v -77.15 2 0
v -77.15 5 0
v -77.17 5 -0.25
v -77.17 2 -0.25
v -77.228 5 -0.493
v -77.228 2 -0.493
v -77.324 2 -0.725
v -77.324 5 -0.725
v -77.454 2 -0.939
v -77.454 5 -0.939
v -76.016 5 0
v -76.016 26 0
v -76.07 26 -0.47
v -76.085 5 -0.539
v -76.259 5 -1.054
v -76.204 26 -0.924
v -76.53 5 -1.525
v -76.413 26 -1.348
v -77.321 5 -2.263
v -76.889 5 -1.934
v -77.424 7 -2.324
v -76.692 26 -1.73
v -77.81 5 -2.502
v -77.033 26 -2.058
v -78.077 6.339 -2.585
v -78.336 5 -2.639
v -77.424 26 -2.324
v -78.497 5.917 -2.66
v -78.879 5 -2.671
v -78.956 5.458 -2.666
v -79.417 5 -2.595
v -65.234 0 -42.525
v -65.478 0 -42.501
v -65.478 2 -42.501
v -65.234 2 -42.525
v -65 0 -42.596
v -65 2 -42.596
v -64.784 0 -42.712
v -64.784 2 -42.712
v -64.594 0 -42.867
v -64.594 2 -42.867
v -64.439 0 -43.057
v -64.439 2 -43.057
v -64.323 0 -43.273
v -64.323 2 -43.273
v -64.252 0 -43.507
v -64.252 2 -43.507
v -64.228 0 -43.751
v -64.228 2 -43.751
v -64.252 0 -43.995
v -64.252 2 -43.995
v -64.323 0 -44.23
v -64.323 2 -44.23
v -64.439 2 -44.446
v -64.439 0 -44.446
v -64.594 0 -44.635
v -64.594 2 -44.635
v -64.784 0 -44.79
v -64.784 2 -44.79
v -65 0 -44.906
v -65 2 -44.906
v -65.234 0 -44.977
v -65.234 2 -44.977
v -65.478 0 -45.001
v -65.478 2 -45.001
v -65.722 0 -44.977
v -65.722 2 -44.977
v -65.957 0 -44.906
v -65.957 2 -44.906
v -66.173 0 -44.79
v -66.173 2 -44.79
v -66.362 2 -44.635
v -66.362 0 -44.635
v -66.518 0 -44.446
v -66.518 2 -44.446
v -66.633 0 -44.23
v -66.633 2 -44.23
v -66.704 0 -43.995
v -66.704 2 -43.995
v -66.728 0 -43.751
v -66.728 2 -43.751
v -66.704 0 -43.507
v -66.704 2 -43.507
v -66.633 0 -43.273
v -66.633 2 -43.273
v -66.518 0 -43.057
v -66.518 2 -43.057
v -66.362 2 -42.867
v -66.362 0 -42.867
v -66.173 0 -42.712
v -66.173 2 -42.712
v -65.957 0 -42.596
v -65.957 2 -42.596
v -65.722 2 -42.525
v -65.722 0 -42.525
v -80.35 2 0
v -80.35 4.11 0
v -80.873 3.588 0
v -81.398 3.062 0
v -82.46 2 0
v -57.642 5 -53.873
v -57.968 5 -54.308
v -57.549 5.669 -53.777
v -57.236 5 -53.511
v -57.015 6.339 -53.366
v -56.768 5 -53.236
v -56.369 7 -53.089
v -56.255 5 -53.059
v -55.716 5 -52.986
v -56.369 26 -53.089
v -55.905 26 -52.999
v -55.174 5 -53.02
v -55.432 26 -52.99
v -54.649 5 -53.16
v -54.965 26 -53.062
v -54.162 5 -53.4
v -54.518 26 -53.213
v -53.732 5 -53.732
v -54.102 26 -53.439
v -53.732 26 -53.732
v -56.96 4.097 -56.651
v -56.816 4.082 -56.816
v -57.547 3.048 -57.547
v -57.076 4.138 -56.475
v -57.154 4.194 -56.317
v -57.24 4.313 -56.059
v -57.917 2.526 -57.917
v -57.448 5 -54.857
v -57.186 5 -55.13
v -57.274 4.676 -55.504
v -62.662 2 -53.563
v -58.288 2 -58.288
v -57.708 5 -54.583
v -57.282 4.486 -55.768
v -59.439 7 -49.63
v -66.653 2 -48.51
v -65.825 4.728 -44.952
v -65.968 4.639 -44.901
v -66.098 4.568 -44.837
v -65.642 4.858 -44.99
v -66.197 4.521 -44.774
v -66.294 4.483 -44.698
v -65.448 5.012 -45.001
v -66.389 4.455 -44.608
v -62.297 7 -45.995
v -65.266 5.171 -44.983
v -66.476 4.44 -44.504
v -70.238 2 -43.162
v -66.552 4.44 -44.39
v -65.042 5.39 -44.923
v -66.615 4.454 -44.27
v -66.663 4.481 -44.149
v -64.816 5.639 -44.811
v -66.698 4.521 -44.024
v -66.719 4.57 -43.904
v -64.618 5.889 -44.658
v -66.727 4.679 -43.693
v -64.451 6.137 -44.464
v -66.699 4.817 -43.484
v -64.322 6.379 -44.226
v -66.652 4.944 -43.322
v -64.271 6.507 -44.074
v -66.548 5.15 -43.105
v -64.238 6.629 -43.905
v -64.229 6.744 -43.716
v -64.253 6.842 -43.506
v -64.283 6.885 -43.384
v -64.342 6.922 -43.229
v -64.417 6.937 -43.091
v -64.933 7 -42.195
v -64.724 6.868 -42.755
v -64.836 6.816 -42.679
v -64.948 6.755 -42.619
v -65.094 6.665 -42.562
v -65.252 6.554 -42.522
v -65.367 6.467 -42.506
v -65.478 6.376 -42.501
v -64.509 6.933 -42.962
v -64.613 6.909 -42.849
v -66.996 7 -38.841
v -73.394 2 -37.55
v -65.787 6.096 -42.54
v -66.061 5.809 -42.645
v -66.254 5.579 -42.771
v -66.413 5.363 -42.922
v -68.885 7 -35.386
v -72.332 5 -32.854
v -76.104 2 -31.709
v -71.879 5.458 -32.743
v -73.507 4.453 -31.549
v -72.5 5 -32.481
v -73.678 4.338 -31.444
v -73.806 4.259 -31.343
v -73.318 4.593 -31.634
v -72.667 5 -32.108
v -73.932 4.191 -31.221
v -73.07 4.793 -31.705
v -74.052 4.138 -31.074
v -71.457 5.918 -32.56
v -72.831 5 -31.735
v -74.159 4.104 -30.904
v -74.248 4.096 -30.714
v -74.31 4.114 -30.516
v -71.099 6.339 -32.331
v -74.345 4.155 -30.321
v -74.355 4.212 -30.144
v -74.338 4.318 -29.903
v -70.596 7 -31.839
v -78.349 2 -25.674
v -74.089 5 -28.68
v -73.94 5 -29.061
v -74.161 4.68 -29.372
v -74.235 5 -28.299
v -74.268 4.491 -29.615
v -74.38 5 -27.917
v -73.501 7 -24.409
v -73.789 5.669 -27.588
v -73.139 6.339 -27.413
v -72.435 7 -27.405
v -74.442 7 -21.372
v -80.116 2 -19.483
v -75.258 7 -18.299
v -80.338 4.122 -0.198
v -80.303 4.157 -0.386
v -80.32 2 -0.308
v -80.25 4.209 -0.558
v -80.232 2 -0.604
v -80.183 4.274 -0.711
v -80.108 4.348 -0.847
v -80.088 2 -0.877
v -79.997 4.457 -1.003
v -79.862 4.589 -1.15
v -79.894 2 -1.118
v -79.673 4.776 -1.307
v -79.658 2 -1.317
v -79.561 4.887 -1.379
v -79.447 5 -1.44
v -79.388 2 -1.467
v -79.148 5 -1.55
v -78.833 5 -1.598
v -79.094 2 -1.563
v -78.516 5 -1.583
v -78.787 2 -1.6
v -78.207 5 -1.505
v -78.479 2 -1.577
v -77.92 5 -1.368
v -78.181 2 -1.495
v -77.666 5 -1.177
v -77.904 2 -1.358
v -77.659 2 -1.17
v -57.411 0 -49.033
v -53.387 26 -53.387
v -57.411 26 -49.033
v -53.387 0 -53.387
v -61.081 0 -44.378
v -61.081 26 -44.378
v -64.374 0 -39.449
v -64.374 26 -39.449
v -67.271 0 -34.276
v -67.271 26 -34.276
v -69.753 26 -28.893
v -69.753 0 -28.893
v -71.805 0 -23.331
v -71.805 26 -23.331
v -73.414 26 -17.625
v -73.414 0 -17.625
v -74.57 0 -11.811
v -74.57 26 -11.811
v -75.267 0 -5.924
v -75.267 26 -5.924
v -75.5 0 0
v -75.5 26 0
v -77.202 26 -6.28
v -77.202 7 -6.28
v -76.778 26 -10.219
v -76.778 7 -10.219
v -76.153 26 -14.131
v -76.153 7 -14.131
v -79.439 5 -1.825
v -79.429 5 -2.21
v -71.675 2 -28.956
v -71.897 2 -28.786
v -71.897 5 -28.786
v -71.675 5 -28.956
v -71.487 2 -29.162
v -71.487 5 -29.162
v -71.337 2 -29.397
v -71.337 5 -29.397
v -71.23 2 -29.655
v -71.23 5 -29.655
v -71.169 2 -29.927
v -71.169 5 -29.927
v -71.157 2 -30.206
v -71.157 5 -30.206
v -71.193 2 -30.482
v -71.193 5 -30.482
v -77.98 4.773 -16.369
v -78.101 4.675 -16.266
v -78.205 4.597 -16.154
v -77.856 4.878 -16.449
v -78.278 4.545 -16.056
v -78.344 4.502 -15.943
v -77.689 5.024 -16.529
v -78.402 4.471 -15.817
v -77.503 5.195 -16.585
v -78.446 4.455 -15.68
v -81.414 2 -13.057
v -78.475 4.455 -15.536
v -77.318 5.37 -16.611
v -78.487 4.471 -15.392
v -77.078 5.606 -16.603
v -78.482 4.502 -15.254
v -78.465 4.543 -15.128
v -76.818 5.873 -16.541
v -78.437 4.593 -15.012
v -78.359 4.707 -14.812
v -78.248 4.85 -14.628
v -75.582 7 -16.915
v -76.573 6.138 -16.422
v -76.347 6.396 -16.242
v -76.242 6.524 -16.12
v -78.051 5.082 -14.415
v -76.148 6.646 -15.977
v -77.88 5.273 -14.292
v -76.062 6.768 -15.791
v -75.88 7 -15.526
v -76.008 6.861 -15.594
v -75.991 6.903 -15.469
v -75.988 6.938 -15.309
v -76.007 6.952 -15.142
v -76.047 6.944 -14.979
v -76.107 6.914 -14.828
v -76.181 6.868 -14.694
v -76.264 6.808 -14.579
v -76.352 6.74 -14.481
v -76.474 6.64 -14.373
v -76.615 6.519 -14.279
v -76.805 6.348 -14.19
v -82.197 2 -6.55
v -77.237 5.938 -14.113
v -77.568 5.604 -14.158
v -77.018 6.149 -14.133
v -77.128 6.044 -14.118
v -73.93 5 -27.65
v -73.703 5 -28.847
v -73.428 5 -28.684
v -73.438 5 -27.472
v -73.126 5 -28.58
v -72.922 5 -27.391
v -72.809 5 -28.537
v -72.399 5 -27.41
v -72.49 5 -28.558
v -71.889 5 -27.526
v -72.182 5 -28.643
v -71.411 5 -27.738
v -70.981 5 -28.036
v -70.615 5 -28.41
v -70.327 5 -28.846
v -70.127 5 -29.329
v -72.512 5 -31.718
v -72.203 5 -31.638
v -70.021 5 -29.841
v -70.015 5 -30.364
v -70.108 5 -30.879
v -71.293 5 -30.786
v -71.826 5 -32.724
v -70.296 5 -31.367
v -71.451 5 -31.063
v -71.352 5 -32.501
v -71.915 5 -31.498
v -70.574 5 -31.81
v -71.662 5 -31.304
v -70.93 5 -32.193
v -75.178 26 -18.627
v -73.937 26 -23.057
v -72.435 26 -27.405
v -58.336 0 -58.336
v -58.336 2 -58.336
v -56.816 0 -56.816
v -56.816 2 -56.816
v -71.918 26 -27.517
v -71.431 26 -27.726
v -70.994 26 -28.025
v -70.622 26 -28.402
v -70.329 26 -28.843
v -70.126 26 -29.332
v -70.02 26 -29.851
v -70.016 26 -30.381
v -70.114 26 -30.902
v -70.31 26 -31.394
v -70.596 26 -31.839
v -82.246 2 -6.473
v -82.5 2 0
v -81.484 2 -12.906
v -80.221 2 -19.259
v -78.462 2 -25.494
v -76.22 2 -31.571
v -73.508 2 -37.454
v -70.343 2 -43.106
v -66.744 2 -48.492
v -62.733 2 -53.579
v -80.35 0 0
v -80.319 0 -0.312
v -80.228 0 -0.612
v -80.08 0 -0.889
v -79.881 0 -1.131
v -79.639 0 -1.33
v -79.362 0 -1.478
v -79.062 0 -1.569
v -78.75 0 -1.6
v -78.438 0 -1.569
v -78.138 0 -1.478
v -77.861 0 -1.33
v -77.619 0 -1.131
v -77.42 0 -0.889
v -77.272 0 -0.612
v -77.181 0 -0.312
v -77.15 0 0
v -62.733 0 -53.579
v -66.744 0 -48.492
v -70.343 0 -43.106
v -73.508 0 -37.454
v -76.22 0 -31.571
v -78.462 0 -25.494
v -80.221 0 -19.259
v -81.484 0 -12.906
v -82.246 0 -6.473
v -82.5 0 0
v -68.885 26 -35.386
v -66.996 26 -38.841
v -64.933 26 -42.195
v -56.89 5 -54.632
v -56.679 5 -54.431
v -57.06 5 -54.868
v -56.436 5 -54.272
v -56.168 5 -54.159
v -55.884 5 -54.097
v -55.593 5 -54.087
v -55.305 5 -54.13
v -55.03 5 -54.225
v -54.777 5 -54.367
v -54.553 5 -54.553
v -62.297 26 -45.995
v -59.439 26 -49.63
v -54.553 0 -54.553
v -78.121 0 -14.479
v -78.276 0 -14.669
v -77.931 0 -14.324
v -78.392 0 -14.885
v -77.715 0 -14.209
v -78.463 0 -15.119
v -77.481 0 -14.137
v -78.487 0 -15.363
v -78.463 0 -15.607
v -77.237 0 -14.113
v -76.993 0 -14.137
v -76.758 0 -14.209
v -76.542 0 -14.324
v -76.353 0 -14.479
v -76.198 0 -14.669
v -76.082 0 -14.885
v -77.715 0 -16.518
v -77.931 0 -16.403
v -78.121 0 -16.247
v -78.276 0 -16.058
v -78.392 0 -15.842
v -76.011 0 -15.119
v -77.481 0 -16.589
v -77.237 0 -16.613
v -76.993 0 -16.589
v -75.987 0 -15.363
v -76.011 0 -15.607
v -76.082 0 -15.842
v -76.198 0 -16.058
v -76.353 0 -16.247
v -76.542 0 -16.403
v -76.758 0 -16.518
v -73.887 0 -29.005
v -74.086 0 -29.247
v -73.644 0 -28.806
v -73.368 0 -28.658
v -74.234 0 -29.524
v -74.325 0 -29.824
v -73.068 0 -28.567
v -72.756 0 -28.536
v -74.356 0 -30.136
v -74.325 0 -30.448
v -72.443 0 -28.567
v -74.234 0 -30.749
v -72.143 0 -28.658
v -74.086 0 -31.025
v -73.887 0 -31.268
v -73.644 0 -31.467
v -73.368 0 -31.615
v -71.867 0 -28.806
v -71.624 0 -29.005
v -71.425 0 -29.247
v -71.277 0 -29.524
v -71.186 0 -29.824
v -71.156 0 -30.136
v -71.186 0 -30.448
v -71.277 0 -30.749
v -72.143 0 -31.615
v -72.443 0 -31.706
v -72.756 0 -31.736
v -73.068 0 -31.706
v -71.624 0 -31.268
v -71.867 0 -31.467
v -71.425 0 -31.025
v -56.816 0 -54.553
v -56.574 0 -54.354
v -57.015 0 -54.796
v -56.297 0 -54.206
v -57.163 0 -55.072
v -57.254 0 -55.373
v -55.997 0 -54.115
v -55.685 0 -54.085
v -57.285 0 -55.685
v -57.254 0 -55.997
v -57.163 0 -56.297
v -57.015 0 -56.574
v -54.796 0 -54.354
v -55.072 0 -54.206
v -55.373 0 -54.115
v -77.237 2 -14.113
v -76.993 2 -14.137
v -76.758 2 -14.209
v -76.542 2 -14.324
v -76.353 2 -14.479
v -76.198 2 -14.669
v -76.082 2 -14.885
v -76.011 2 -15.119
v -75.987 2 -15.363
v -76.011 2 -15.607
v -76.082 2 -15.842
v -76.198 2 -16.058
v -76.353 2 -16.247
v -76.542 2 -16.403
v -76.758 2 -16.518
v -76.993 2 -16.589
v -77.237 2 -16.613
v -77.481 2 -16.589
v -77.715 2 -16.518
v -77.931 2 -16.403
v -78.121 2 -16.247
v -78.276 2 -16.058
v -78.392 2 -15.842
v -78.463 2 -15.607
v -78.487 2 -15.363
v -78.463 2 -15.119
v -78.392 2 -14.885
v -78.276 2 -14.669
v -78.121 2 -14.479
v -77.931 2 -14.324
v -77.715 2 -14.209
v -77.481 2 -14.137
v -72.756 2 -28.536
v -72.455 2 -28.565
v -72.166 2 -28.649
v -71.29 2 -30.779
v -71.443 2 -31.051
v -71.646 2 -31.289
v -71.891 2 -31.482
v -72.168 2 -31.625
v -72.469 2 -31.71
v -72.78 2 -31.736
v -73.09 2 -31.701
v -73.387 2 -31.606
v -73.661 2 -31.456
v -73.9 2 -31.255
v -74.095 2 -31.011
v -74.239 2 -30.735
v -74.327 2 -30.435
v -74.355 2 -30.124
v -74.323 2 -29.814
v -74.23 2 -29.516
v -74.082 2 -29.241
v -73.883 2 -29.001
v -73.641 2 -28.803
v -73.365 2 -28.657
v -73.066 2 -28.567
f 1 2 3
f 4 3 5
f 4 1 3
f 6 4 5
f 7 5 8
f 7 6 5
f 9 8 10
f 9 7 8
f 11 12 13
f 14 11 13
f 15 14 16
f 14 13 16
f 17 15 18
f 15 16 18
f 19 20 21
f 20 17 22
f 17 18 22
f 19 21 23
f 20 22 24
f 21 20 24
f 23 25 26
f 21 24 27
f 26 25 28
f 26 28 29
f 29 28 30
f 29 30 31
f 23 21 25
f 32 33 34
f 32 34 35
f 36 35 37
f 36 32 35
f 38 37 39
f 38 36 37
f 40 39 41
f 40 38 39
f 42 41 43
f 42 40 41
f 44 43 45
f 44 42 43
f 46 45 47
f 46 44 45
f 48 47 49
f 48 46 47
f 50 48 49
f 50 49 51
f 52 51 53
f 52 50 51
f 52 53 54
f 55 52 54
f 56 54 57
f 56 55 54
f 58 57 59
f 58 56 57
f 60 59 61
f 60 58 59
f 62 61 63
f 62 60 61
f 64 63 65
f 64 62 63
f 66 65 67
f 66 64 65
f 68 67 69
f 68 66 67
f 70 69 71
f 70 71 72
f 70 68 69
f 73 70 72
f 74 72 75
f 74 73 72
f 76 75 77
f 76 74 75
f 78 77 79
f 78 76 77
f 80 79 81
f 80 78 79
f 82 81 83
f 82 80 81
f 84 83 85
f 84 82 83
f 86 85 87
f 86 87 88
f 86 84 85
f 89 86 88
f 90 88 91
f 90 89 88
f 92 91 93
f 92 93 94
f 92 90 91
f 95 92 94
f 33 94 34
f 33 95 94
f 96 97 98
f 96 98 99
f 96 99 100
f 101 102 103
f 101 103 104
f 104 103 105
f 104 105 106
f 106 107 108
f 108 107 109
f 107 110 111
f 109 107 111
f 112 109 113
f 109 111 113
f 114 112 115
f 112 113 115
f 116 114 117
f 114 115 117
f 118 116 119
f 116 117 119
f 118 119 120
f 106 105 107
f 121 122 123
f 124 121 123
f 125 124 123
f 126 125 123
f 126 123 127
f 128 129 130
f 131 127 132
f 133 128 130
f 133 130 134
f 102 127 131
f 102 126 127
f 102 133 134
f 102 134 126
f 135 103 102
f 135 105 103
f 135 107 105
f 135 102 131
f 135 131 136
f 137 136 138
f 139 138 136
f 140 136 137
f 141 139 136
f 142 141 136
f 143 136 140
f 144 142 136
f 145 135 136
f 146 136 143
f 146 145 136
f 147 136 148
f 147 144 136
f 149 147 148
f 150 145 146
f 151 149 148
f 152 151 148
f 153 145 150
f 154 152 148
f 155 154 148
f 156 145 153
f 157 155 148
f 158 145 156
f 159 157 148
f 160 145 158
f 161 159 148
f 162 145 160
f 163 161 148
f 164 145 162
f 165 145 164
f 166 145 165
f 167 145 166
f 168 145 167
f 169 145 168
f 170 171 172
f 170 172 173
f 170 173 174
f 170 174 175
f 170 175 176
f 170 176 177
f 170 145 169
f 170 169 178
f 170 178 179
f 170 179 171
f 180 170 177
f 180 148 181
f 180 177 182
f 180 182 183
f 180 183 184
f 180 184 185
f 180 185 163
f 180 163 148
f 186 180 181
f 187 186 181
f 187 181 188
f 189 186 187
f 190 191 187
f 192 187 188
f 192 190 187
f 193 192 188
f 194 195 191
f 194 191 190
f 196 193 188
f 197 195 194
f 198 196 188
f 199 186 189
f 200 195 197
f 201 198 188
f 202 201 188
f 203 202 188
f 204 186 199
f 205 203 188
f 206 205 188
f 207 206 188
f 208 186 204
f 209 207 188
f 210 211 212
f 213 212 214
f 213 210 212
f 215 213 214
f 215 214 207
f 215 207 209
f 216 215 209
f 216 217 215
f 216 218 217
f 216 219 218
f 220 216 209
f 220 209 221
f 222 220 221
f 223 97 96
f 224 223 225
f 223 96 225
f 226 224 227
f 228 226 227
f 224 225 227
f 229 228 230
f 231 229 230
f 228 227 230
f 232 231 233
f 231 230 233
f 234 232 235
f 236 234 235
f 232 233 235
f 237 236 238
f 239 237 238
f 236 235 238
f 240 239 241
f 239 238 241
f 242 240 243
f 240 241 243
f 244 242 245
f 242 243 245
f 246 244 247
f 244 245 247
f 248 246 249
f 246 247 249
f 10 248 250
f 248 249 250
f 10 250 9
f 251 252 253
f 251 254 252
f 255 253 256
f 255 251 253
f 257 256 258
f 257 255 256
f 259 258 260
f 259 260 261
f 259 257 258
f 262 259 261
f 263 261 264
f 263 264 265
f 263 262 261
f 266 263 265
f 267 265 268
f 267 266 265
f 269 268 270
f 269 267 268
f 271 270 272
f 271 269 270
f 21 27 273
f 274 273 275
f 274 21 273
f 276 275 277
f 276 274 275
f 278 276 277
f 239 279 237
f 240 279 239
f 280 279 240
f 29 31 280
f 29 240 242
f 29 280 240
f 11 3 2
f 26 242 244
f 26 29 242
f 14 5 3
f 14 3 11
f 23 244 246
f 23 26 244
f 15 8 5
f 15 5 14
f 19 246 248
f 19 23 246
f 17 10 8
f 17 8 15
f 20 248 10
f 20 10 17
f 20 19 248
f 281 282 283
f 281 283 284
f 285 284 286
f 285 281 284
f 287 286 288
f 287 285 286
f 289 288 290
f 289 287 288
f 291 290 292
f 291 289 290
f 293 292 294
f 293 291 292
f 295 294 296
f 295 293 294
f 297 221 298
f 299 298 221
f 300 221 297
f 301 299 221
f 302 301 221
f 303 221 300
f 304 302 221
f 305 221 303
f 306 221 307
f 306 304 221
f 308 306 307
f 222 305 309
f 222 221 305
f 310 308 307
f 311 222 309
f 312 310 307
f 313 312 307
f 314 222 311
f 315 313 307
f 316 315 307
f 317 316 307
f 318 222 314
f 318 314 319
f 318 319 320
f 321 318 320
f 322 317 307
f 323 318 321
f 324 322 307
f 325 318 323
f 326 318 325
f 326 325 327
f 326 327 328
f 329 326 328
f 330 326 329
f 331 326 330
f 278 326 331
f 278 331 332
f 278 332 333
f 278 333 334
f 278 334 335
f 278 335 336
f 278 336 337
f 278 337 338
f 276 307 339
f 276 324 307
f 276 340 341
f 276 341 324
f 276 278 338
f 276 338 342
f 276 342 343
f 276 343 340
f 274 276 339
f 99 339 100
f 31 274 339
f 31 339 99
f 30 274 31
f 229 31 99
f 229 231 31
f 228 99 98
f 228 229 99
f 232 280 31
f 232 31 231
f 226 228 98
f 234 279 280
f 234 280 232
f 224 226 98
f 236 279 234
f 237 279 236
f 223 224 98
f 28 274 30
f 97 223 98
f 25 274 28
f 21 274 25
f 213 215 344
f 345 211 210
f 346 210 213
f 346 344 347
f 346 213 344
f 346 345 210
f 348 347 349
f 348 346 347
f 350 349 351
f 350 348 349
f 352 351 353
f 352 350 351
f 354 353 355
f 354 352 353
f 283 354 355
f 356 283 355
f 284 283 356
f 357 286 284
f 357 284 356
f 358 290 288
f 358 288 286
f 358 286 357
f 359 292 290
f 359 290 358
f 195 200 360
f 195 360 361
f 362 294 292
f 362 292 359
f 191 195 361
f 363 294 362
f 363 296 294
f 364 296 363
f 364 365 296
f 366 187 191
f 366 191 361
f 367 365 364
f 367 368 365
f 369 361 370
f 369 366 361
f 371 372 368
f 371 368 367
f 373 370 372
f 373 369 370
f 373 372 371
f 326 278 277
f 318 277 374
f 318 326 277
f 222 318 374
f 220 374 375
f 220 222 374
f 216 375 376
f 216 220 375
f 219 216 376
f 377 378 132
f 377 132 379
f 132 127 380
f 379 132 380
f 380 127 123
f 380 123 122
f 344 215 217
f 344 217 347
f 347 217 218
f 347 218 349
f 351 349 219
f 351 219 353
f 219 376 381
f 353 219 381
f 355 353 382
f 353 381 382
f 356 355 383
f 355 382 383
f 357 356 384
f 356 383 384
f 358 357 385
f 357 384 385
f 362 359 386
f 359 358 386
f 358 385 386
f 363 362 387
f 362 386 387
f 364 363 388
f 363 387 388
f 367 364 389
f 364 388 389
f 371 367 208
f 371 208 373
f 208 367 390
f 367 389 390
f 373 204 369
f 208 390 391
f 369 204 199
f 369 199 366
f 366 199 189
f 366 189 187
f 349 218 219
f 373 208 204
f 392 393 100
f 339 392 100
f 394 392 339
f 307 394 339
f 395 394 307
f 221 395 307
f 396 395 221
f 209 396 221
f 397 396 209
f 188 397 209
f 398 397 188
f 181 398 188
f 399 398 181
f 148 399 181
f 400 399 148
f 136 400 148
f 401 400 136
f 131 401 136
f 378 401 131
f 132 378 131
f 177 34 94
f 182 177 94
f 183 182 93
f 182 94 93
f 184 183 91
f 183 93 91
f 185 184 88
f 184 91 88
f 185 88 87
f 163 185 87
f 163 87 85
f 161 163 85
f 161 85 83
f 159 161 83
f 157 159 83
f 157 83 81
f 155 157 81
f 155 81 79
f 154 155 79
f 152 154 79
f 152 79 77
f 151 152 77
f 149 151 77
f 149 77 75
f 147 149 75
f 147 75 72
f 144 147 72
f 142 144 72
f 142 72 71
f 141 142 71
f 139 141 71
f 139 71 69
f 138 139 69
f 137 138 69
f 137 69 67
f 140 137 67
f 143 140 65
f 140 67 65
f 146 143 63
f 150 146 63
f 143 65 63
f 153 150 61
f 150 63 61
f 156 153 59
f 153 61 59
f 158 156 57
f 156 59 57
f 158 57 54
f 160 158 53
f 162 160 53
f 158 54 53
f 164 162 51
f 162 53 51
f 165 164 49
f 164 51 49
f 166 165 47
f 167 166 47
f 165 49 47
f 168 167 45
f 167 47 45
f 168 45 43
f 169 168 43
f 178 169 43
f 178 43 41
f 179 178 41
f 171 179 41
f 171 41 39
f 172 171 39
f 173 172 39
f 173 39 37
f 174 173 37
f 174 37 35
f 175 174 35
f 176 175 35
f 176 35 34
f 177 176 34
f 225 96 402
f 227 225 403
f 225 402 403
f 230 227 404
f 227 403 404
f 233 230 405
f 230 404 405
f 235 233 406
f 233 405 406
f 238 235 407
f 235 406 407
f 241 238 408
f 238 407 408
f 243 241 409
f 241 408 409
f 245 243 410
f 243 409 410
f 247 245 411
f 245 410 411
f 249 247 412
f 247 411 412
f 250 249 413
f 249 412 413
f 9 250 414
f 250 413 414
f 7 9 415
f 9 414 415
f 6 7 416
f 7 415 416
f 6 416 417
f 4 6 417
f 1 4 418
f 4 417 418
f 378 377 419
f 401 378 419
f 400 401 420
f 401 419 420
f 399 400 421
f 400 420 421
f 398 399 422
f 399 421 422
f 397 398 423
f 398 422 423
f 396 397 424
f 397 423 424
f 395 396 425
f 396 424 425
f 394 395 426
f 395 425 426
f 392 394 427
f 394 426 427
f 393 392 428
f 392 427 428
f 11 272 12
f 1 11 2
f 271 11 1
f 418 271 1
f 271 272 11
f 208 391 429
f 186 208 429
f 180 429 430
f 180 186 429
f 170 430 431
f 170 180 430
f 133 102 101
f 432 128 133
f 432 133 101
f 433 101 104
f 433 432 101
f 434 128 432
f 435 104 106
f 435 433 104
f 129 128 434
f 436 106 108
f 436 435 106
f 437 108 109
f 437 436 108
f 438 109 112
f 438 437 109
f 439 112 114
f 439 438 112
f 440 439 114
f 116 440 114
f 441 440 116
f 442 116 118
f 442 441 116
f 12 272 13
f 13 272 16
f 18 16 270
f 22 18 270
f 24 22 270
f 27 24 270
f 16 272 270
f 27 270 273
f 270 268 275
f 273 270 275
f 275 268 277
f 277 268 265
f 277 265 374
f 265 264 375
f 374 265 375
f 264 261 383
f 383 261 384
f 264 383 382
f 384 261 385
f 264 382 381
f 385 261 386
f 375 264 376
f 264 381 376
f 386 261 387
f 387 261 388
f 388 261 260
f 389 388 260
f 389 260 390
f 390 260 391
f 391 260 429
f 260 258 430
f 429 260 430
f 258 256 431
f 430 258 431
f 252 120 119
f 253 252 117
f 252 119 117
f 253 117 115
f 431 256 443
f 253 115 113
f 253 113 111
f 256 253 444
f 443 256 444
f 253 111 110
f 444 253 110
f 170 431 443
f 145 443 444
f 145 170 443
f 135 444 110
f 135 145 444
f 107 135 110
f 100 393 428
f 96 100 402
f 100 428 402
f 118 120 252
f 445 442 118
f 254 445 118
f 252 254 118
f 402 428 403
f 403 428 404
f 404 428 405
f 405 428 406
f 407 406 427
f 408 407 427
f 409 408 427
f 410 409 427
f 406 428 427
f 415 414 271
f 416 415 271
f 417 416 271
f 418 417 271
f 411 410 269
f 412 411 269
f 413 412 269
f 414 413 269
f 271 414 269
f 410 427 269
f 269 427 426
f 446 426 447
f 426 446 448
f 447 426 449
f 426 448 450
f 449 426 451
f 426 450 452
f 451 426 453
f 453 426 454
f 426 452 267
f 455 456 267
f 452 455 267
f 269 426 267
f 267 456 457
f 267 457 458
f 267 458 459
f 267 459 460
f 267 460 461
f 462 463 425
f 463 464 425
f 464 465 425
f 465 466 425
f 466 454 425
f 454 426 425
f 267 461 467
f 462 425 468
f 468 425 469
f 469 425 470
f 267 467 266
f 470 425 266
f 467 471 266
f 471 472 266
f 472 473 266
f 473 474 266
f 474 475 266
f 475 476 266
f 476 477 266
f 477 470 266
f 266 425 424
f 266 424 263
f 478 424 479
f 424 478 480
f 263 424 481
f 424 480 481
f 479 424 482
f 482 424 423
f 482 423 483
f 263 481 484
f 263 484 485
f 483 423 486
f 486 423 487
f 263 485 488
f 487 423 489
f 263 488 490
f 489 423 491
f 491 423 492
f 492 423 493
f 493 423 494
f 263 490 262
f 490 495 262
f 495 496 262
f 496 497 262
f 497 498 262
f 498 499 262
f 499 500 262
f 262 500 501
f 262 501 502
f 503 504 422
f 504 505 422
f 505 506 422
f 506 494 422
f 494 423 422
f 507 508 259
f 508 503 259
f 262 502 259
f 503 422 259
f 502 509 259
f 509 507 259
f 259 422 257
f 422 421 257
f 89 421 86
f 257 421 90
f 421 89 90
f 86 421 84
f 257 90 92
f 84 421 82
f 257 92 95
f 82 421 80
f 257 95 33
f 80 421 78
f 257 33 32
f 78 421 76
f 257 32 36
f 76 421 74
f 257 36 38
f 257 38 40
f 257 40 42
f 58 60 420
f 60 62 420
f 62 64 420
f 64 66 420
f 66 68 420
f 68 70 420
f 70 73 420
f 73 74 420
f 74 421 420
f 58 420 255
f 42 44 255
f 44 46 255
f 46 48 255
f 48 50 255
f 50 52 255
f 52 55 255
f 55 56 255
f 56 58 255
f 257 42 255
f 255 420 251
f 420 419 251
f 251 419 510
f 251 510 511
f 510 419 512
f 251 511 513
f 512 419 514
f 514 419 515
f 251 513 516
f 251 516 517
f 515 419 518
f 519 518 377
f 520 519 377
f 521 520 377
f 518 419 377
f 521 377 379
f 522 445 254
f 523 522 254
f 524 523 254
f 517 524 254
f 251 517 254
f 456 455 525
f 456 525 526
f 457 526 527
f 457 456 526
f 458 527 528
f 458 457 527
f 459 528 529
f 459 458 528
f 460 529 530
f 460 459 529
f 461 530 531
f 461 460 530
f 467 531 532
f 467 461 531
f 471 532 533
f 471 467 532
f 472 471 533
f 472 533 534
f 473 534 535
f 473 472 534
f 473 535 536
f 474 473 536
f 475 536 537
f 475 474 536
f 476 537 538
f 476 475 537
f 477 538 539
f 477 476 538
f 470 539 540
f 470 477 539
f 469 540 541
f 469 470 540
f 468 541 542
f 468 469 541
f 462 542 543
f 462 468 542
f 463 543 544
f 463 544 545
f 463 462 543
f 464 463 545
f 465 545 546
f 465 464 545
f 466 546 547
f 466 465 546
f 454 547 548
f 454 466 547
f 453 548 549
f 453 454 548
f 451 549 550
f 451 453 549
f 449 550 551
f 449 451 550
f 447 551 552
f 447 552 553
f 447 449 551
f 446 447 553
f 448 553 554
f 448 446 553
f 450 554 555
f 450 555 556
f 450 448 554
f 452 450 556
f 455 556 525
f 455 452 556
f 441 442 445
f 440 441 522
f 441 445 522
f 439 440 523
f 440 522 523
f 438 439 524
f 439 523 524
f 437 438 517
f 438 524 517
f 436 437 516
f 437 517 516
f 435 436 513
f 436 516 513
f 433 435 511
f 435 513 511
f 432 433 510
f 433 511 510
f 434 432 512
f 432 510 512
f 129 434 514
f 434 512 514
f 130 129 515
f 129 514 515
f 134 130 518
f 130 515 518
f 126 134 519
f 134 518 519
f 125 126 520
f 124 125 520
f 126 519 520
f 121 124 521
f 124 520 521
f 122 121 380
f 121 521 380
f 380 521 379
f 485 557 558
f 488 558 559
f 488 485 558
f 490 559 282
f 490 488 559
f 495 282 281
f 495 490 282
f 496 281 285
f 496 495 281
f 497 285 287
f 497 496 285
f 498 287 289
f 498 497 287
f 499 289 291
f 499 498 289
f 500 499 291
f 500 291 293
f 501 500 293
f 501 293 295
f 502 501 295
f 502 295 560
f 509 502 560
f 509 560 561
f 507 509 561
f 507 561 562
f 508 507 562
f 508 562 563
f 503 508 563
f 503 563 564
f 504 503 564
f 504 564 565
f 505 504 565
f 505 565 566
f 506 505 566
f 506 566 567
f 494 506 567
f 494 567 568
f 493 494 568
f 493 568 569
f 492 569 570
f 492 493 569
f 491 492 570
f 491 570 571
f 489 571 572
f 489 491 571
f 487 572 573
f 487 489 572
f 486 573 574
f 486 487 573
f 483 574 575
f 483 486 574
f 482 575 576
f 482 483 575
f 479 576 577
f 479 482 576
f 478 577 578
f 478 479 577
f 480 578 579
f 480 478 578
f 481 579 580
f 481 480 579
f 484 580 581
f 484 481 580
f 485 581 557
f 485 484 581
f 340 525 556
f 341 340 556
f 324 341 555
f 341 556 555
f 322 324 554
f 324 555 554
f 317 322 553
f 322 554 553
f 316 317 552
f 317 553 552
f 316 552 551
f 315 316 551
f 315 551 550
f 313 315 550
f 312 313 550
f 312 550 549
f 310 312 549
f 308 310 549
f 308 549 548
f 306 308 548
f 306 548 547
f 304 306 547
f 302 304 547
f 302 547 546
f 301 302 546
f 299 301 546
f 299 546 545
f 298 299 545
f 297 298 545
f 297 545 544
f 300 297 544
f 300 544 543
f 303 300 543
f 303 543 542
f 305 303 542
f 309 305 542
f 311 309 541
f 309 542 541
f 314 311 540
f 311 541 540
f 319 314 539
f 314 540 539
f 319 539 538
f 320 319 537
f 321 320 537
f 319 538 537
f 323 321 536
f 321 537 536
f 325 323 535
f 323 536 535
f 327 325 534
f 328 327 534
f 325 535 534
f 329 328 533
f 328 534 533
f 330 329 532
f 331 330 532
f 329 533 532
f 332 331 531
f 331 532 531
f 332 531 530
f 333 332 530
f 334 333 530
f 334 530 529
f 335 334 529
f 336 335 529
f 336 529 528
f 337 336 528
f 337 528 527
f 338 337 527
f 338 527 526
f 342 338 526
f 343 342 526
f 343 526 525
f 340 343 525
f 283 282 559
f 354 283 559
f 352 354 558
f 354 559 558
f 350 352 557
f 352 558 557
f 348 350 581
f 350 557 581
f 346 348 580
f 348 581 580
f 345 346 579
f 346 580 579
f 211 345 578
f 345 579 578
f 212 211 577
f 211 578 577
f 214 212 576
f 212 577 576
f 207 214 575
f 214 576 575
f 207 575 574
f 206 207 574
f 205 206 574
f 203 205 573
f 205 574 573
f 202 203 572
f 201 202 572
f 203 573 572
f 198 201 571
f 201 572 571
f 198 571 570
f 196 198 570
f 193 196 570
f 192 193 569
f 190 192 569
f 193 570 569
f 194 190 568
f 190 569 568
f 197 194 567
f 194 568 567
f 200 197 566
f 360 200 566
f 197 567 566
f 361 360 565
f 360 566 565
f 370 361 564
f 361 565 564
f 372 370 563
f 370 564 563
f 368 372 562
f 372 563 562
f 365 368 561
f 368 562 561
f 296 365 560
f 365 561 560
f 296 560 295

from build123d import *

# Parameters (mm, degrees)
SKETCH1_R           = 1.6
SKETCH1_R_2         = 1.25
BOSS_EXTRUDE1_DEPTH = 2
BOSS_EXTRUDE3_DEPTH = 24
CHAMFER2_SIZE       = 5
SKETCH3_R           = 2.75
CUT_EXTRUDE1_DEPTH  = 21


with BuildPart() as part:
    # Sketch1 → Boss-Extrude1 (new body)
    with BuildSketch(Plane(origin=(0, 0, 0), x_dir=(1, 0, 0), z_dir=(0, 1, 0))):
        with BuildLine():
            Line((-53.38656198, 53.38656198), (-54.553288169, 54.553288169))
            ThreePointArc((-54.553288169, 54.553288169), (-56.816029868, 54.553288169), (-56.816029868, 56.816029868))
            Line((-56.816029868, 56.816029868), (-58.336309448, 58.336309448))
            ThreePointArc((-58.336309448, 58.336309448), (-76.220061432, 31.57138317), (-82.5, 0))
            Line((-82.5, 0), (-80.35, 0))
            ThreePointArc((-80.35, 0), (-78.75, 1.6), (-77.15, 0))
            Line((-77.15, 0), (-75.5, 0))
            ThreePointArc((-75.5, 0), (-69.752904705, 28.892599144), (-53.38656198, 53.38656198))
        make_face()
        with Locations(Location((-72.755513185, 30.136320299, 0), (0, 0, 270))):
            Circle(SKETCH1_R, mode=Mode.SUBTRACT)
        with Locations(Location((-77.236840832, 15.363362859, 0), (0, 0, 270))):
            Circle(SKETCH1_R_2, mode=Mode.SUBTRACT)
        with Locations(Location((-65.478231969, 43.75115585, 0), (0, 0, 270))):
            Circle(SKETCH1_R_2, mode=Mode.SUBTRACT)
    extrude(amount=BOSS_EXTRUDE1_DEPTH)

    # Sketch2 → Boss-Extrude3 (add)
    with BuildSketch(Plane(origin=(0, 2, 0), x_dir=(1, 0, 0), z_dir=(0, 1, 0))):
        with BuildLine():
            Line((-75.5, 0), (-77.15, 0))
            ThreePointArc((-77.15, 0), (-77.22797812, 0.493405915), (-77.454311746, 0.938718248))
            ThreePointArc((-77.454311746, 0.938718248), (-77.086470316, 7.562898661), (-76.153142939, 14.131305885))
            ThreePointArc((-76.153142939, 14.131305885), (-74.455316583, 21.326592742), (-72.07927757, 28.327250276))
            ThreePointArc((-72.07927757, 28.327250276), (-71.988492028, 28.556854202), (-71.896975095, 28.786167586))
            ThreePointArc((-71.896975095, 28.786167586), (-71.277594826, 29.523329822), (-71.193405789, 30.482471253))
            ThreePointArc((-71.193405789, 30.482471253), (-68.314800527, 36.47311401), (-64.933244978, 42.194936357))
            ThreePointArc((-64.933244978, 42.194936357), (-60.45388582, 48.389737192), (-55.385713525, 54.112834731))
            ThreePointArc((-55.385713525, 54.112834731), (-54.936360269, 54.270428139), (-54.553288169, 54.553288169))
            Line((-54.553288169, 54.553288169), (-53.38656198, 53.38656198))
            ThreePointArc((-53.38656198, 53.38656198), (-69.752904705, 28.892599144), (-75.5, 0))
        make_face()
    extrude(amount=BOSS_EXTRUDE3_DEPTH)

    # Chamfer2
    # the kernel refuses this chamfer: 5 mm, written as the material it adds along each edge
    with BuildSketch(Plane(origin=(-0.000495077, 2, 0.039996936), x_dir=(-0.5896650558318113, 0, -0.8076478947727573), z_dir=(0.8076478947727573, 0, -0.5896650558318113))) as chamfer2_piece_1_section:
        Polygon((77.46 + CHAMFER2_SIZE, 0), (77.46, CHAMFER2_SIZE), (77.46, 0), align=None)
    chamfer2_piece_1 = revolve(axis=Axis((-0.000495077, 2, 0.039996936), (0, 1, 0)), revolution_arc=40.171888597, mode=Mode.PRIVATE)
    chamfer2_piece_1 = chamfer2_piece_1 - Plane(origin=(-65.478231969, 3.629075294, -43.75115585), x_dir=(0, 0, 1), z_dir=(0, -1, 0)) * Cylinder(1.25, 330, mode=Mode.PRIVATE)
    chamfer2_piece_1 = chamfer2_piece_1 - Plane(origin=(-72.755513185, 3.629075294, -30.136320299), x_dir=(0, 0, 1), z_dir=(0, -1, 0)) * Cylinder(1.6, 330, mode=Mode.PRIVATE)
    chamfer2_piece_1 = split(chamfer2_piece_1, bisect_by=Plane(origin=(-53.187185599, 3.629075294, -53.187185599), z_dir=(-0.7071067811865476, 0, 0.7071067811865476)), keep=Keep.TOP, mode=Mode.PRIVATE)
    chamfer2_piece_1 = chamfer2_piece_1 - Plane(origin=(-55.684659018, 3.629075294, -55.684659018), x_dir=(0.7071067811865365, 0, 0.7071067811865587), z_dir=(0, -1, 0)) * Cylinder(1.6, 330, mode=Mode.PRIVATE)
    add(chamfer2_piece_1)
    with BuildSketch(Plane(origin=(-0.000495079, 2, 0.039996936), x_dir=(-0.8539218863713415, 0, -0.52040120289639), z_dir=(0.52040120289639, 0, -0.8539218863713415))) as chamfer2_piece_2_section:
        Polygon((77.459999998 + CHAMFER2_SIZE, 0), (77.459999998, CHAMFER2_SIZE), (77.459999998, 0), align=None)
    chamfer2_piece_2 = revolve(axis=Axis((-0.000495079, 2, 0.039996936), (0, 1, 0)), revolution_arc=40.146560284, mode=Mode.PRIVATE)
    chamfer2_piece_2 = chamfer2_piece_2 - Plane(origin=(-77.236840832, 3.628431505, -15.363362859), x_dir=(0, 0, 1), z_dir=(0, -1, 0)) * Cylinder(1.25, 330, mode=Mode.PRIVATE)
    chamfer2_piece_2 = chamfer2_piece_2 - Plane(origin=(-72.755513185, 3.628431505, -30.136320299), x_dir=(0, 0, 1), z_dir=(0, -1, 0)) * Cylinder(1.6, 330, mode=Mode.PRIVATE)
    chamfer2_piece_2 = chamfer2_piece_2 - Plane(origin=(-78.75, 3.628431505, 0), x_dir=(-1, 0, 0), z_dir=(0, -1, 0)) * Cylinder(1.6, 330, mode=Mode.PRIVATE)
    chamfer2_piece_2 = split(chamfer2_piece_2, bisect_by=Plane(origin=(-75.22737359, 3.628431505, 0), z_dir=(0, 0, -1)), keep=Keep.TOP, mode=Mode.PRIVATE)
    add(chamfer2_piece_2)

    # Sketch3 → Cut-Extrude1 (cut)
    with BuildSketch(Plane(origin=(0, 26, 0), x_dir=(1, 0, 0), z_dir=(0, 1, 0))):
        with Locations((-72.755513185, 30.136320299)):
            Circle(SKETCH3_R)
        with Locations((-78.76534385, -0.077138745)):
            Circle(SKETCH3_R)
        with Locations((-55.616814575, 55.733901863)):
            Circle(SKETCH3_R)
    extrude(amount=-CUT_EXTRUDE1_DEPTH, mode=Mode.SUBTRACT)


solid = part.part
